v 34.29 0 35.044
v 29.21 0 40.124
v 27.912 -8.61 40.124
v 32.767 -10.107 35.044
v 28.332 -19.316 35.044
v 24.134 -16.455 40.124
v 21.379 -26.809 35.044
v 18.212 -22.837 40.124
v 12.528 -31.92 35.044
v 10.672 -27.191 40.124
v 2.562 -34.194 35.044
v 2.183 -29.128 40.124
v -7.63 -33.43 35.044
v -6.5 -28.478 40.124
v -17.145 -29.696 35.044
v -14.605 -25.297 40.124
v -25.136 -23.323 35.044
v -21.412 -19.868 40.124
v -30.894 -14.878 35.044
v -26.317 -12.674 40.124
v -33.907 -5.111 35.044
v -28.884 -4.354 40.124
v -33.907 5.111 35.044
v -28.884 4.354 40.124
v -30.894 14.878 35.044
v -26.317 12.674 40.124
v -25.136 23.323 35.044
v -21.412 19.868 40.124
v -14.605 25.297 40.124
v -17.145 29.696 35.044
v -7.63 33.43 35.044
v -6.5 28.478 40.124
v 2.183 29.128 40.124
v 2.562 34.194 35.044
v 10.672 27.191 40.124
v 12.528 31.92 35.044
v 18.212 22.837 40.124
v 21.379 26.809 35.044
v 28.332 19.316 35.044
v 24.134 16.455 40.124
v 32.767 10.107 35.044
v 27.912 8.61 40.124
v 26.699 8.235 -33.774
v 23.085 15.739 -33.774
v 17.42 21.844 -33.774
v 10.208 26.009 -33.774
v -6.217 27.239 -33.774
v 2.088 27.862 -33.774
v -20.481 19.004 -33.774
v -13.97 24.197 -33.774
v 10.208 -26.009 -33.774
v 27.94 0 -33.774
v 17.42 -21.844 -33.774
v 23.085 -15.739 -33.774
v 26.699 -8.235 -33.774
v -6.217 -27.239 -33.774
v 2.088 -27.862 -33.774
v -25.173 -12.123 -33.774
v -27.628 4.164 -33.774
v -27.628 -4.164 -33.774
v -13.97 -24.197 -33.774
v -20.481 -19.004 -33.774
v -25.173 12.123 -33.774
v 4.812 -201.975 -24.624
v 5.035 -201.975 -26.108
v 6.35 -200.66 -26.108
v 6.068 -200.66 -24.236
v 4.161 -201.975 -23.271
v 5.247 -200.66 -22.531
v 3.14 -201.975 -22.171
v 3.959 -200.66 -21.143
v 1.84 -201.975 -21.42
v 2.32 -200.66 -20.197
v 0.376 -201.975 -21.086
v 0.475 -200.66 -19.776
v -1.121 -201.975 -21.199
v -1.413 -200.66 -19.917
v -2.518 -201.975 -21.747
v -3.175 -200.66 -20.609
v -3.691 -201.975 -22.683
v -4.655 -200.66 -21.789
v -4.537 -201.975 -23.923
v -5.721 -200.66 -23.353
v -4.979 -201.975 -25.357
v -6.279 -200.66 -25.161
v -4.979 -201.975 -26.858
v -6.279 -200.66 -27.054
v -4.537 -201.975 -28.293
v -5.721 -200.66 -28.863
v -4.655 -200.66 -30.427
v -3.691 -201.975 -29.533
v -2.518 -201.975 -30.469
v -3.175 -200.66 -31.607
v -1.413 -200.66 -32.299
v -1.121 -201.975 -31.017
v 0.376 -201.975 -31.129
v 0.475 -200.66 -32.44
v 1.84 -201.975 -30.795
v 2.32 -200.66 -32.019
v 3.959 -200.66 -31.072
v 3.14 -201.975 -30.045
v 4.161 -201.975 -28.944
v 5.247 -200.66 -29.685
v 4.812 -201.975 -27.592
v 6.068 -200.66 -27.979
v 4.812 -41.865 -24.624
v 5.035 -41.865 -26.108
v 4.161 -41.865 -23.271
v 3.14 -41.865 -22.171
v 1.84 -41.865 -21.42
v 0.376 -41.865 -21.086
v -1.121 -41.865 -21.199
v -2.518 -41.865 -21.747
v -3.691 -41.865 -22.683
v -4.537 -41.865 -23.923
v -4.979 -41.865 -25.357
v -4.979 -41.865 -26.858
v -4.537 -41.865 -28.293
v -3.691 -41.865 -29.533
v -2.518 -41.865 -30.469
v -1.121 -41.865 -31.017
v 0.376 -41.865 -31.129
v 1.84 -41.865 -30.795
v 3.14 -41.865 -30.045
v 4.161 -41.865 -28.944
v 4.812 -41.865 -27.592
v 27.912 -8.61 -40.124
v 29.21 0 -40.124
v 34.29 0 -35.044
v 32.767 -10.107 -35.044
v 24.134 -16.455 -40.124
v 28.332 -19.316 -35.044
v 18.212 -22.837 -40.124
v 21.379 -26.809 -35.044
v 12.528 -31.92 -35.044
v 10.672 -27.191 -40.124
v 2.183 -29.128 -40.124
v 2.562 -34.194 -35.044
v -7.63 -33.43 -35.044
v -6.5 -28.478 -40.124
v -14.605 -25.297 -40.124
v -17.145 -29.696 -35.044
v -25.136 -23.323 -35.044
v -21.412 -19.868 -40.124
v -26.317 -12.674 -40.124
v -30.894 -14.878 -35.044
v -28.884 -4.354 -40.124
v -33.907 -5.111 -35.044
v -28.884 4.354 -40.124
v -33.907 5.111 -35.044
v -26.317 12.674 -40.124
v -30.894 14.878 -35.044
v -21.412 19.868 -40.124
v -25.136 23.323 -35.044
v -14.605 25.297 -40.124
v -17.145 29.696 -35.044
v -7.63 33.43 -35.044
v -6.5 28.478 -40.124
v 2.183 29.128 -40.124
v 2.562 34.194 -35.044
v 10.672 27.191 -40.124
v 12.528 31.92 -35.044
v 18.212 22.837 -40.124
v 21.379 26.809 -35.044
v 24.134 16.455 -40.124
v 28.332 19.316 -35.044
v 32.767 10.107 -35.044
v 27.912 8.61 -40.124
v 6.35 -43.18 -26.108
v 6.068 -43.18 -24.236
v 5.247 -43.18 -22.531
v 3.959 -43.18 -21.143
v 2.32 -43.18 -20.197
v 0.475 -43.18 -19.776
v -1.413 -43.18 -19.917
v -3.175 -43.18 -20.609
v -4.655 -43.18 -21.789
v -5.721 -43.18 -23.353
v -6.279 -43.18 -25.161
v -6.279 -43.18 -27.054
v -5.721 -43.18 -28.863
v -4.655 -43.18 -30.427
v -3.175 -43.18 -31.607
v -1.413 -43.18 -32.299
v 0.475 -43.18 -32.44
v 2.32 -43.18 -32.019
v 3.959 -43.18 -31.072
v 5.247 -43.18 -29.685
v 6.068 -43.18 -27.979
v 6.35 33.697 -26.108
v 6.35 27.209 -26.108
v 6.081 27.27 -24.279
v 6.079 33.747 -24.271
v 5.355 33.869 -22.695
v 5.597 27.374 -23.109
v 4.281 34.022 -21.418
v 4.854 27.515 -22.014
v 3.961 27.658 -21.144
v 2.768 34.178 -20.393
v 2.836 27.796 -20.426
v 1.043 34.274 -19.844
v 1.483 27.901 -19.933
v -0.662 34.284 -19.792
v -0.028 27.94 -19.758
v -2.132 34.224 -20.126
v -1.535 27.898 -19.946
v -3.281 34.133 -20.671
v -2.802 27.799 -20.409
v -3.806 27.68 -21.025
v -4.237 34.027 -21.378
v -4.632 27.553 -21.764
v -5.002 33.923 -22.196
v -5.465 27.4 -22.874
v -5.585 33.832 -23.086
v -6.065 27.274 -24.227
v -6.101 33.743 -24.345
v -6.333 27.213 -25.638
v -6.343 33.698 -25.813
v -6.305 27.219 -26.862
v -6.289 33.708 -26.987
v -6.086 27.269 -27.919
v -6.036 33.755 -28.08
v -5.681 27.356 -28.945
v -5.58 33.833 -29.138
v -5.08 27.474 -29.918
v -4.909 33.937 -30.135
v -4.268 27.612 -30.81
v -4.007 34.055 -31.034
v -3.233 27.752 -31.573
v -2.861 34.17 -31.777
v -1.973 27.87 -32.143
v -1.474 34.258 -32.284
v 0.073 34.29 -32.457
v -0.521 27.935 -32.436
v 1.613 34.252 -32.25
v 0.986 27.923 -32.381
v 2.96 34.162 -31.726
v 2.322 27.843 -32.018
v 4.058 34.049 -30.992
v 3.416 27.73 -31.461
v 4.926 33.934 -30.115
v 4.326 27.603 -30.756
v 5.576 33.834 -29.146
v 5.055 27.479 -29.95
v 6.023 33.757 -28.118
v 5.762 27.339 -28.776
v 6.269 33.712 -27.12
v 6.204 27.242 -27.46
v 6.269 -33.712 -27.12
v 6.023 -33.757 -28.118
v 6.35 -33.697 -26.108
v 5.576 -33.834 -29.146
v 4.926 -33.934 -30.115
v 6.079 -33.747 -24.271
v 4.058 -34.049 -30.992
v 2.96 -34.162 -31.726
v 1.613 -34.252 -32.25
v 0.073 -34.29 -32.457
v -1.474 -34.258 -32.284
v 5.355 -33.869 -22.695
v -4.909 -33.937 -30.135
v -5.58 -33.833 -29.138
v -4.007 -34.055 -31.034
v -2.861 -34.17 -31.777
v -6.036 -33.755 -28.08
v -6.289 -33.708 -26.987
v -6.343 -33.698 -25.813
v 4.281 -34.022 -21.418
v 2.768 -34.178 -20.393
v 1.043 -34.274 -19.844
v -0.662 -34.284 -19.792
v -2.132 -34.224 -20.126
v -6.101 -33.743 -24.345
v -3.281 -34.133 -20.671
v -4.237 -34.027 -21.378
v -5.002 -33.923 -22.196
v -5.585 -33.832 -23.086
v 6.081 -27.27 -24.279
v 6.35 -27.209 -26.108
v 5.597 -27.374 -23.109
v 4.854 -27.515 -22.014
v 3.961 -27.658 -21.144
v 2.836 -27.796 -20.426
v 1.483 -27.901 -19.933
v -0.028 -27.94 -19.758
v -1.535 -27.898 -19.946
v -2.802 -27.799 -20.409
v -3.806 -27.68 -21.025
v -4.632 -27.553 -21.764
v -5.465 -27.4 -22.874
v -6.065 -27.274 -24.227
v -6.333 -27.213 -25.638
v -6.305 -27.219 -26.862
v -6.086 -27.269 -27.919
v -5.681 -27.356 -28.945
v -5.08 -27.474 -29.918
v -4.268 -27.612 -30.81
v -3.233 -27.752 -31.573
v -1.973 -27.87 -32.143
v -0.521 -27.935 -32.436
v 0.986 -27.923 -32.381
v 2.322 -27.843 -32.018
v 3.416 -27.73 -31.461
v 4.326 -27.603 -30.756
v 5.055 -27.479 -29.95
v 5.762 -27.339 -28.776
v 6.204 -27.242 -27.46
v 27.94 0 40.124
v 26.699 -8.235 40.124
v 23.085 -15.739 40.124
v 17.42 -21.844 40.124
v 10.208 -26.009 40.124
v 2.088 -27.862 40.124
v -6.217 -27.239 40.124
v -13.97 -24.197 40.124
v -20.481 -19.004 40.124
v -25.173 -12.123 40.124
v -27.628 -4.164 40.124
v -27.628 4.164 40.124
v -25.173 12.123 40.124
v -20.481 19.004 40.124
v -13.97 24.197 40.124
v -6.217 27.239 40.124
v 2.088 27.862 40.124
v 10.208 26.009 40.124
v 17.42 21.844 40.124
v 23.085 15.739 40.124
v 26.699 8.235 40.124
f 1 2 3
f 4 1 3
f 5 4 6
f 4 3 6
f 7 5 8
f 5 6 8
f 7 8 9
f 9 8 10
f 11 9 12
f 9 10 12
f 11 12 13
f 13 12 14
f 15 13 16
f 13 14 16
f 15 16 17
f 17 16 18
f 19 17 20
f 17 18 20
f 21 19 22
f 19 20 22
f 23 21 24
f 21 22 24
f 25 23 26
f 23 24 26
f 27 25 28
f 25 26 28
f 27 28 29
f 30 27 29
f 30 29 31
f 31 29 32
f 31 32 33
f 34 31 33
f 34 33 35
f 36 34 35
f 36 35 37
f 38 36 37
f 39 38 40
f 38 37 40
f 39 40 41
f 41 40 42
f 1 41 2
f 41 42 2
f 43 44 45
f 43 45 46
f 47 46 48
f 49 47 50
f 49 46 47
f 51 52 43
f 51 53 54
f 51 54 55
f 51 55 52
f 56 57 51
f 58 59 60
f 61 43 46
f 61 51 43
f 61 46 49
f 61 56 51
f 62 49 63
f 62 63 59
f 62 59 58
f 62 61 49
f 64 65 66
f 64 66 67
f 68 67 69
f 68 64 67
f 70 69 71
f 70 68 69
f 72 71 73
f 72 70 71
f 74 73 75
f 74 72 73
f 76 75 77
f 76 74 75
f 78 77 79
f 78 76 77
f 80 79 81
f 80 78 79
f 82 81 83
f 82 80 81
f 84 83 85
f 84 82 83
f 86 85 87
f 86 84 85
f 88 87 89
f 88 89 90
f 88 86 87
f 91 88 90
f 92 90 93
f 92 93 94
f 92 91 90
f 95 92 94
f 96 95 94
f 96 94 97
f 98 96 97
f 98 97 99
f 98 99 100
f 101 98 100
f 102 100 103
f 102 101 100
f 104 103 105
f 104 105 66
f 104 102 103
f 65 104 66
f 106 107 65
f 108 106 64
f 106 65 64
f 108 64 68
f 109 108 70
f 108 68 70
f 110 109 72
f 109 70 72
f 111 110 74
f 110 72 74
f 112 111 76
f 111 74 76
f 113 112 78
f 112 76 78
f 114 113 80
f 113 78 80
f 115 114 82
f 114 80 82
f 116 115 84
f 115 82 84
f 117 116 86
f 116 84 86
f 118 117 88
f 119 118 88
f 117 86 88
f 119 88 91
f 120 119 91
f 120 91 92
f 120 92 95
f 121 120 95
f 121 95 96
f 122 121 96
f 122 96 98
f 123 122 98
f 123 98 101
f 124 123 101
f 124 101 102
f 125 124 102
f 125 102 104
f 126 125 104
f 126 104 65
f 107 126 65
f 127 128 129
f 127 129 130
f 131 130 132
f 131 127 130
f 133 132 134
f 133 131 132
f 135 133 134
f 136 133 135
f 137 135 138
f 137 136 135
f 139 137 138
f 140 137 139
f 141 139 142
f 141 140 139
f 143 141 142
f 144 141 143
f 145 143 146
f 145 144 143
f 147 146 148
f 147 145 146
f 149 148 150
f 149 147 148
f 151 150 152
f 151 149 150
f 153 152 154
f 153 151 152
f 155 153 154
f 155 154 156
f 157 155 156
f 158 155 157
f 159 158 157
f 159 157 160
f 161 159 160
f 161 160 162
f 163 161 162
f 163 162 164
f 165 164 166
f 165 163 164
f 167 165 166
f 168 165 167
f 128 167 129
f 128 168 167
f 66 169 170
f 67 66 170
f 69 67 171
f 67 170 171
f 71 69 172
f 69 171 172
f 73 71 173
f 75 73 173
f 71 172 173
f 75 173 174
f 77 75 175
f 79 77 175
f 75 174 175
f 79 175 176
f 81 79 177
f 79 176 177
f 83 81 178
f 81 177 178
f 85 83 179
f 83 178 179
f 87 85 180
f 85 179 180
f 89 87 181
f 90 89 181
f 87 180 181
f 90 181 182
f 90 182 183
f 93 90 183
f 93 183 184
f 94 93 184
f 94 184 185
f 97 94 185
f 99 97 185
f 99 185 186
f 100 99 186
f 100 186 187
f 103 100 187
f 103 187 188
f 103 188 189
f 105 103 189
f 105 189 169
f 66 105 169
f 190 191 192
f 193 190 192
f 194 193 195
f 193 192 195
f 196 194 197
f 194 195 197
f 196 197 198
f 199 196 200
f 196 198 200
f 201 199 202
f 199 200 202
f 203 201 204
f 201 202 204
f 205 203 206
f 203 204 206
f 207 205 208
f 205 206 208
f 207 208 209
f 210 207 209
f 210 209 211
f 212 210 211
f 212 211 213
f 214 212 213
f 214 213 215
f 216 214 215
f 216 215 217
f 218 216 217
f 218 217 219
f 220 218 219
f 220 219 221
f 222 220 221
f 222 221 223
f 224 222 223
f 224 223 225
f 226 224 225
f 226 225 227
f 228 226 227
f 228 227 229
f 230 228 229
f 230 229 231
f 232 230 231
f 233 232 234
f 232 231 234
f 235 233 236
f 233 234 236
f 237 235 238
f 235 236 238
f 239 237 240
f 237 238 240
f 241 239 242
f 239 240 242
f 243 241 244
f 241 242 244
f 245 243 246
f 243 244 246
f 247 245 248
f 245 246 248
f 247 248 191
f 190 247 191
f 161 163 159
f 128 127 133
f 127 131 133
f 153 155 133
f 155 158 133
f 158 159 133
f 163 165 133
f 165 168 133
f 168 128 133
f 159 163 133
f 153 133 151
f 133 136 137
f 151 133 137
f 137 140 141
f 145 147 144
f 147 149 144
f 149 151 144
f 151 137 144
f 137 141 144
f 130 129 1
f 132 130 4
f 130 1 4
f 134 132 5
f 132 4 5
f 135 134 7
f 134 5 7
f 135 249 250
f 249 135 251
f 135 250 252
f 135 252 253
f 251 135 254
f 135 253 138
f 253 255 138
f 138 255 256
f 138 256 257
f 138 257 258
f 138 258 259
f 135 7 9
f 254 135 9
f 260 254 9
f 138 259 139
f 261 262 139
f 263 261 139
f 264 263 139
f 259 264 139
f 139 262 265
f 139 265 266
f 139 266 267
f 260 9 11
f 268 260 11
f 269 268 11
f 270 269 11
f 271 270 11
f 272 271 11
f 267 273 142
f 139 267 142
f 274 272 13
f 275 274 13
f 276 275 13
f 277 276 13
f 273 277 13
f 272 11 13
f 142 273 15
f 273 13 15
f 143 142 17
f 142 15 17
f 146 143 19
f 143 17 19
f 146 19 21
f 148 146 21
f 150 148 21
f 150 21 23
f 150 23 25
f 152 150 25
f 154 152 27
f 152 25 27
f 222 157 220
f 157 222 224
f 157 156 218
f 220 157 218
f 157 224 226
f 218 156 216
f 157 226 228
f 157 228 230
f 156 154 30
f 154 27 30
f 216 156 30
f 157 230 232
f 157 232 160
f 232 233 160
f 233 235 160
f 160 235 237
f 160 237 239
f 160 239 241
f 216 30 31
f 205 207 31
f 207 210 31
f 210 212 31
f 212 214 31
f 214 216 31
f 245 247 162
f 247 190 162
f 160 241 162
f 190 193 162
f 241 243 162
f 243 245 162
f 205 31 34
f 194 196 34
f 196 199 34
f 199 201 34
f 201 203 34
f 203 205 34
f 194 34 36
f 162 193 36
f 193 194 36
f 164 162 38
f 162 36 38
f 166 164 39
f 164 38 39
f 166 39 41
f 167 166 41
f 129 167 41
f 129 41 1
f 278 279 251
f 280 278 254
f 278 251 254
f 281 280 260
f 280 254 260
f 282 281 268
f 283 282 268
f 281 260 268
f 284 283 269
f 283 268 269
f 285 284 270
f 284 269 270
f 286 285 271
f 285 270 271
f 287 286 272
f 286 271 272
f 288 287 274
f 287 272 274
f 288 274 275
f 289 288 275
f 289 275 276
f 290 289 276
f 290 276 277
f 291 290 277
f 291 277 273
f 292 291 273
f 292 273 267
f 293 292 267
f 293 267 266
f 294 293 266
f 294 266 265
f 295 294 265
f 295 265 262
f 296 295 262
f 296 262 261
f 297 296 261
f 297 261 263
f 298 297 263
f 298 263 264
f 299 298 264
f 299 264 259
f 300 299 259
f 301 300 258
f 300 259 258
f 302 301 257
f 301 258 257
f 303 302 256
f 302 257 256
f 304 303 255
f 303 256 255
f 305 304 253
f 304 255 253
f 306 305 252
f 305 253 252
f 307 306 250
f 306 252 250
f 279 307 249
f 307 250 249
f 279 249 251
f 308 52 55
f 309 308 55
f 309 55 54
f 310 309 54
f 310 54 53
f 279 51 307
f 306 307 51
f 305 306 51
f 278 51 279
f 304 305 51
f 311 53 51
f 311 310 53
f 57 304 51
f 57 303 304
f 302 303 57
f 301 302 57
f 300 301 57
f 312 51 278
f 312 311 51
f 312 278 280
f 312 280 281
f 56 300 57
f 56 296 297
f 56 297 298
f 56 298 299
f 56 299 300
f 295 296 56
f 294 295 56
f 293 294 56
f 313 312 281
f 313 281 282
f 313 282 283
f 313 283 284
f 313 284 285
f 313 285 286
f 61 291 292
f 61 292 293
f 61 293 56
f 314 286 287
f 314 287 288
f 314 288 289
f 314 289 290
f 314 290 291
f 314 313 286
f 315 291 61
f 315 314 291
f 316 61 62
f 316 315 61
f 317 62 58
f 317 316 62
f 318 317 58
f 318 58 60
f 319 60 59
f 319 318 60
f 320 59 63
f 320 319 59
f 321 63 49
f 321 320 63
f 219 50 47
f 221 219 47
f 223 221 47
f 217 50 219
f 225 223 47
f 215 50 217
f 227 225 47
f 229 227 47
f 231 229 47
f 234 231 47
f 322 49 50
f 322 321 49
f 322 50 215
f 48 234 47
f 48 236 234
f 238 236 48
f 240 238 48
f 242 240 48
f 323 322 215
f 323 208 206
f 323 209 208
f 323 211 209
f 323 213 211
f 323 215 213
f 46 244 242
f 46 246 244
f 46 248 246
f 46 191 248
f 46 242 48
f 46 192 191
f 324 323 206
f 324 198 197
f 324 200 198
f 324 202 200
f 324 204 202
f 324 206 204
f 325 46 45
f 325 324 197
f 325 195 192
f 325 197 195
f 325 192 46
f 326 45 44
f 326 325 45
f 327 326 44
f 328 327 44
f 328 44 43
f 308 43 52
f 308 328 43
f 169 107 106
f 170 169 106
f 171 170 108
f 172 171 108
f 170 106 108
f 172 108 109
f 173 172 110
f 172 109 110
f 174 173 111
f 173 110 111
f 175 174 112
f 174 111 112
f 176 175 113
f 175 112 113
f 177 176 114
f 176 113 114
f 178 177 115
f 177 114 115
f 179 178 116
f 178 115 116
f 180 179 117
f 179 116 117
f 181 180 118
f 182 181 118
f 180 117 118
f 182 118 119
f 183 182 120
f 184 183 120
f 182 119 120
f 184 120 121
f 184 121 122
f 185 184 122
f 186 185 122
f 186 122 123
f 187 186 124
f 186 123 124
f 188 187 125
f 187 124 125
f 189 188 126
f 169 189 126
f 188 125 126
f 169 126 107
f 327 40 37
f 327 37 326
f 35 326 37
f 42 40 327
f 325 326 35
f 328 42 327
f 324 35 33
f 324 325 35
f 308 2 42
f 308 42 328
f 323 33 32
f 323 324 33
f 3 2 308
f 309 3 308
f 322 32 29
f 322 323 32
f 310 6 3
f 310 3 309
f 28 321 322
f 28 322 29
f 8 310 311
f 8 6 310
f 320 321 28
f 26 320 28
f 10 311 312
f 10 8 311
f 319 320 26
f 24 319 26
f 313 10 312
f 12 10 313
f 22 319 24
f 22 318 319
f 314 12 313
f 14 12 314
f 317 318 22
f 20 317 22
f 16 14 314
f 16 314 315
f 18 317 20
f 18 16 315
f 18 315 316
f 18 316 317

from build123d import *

# Parameters (mm, degrees)
F0_W      = 34.29
F0_H      = 80.2478848061
F5_T      = -6.35
F4_R      = 6.35
F6_DEPTH  = 165.1
F12_R     = 6.35
F7_DEPTH  = 165.1
F8_R      = 5.0354944202
F13_DEPTH = 237.491
F14_DEPTH = 72.3910001
F16_SIZE  = 5.08
F11_SIZE  = 5.08


# Not quite as in the source:
# - a fillet or chamfer that OpenCascade refuses, or shapes differently, is made with other operations: its cross-section is extruded or revolved along the edge and cut away or added


with BuildPart() as f2:
    # F0 (on Front) → F2 (revolve)
    with BuildSketch(Plane.XZ):
        with Locations((17.145, 0)):
            Rectangle(F0_W, F0_H)
    revolve(axis=Axis((0, 0, -6.2726922333), (0, 0, -1)))

    # F5
    f5_openings = [f2.faces().sort_by_distance(p)[0] for p in [
        (0, 0, 40.123942),
    ]]
    offset(amount=F5_T, openings=f5_openings)


with BuildPart() as f6:
    # F4 (on offset) → F6 (new body)
    with BuildSketch(Plane.XZ.offset(38.1)):
        with Locations((0, -12.0859783907)):
            Circle(F4_R)
    extrude(amount=F6_DEPTH)


with BuildPart() as f7:
    # F12 (on offset) → F7 (new body)
    with BuildSketch(Plane.XZ.offset(38.1)):
        with Locations((0, -26.1077899699)):
            Circle(F12_R)
    extrude(amount=F7_DEPTH)


with BuildPart() as f13_tool:
    # F8 (on face) → F13 (new body, through all)
    with BuildSketch(Plane.XZ.offset(203.2)):
        with Locations((0, -26.1077899699)):
            Circle(F8_R)
    extrude(amount=-F13_DEPTH)


with BuildPart() as f2_1:
    add(f2.part)

    # F13: cut by f13_tool
    add(f13_tool.part, mode=Mode.SUBTRACT)

    # F12 (on offset) → F14 (cut, through all)
    with BuildSketch(Plane.XZ.offset(38.1)):
        with Locations((0, -26.1077899699)):
            Circle(F12_R)
    extrude(amount=-F14_DEPTH, mode=Mode.SUBTRACT)

    # F16
    f16_edges = [f2_1.edges().sort_by_distance(p)[0] for p in [
        (-34.29, 0, 40.123942),
    ]]
    chamfer(f16_edges, length=F16_SIZE)

    # F11
    f11_edges = [f2_1.edges().sort_by_distance(p)[0] for p in [
        (-34.29, 0, -40.123942),
    ]]
    chamfer(f11_edges, length=F11_SIZE)


with BuildPart() as f7_1:
    add(f7.part)

    # F13: cut by f13_tool
    add(f13_tool.part, mode=Mode.SUBTRACT)

    # F10: chamfer of 2.54 on 1 edges, made by hand

    # F10_s1 → F10_t2 (revolve, cut)
    with BuildSketch(Plane.XY.offset(-26.1077899699)):
        Polygon((6.35, -200.66), (3.81, -203.2), (6.35, -203.2), align=None)
    revolve(axis=Axis((0, -203.2, -26.1077899699), (0, -1, 0)), mode=Mode.SUBTRACT)

    # F15: chamfer of 5.08 on 1 edges, made by hand

    # F15_s1 → F15_t2 (revolve, cut)
    with BuildSketch(Plane.XY.offset(-26.1077899699)):
        Polygon((6.35, -43.18), (1.27, -38.1), (6.35, -38.1), align=None)
    revolve(axis=Axis((0, -38.1, -26.1077899699), (0, -1, 0)), mode=Mode.SUBTRACT)


solid = Compound([f2_1.part, f7_1.part])
